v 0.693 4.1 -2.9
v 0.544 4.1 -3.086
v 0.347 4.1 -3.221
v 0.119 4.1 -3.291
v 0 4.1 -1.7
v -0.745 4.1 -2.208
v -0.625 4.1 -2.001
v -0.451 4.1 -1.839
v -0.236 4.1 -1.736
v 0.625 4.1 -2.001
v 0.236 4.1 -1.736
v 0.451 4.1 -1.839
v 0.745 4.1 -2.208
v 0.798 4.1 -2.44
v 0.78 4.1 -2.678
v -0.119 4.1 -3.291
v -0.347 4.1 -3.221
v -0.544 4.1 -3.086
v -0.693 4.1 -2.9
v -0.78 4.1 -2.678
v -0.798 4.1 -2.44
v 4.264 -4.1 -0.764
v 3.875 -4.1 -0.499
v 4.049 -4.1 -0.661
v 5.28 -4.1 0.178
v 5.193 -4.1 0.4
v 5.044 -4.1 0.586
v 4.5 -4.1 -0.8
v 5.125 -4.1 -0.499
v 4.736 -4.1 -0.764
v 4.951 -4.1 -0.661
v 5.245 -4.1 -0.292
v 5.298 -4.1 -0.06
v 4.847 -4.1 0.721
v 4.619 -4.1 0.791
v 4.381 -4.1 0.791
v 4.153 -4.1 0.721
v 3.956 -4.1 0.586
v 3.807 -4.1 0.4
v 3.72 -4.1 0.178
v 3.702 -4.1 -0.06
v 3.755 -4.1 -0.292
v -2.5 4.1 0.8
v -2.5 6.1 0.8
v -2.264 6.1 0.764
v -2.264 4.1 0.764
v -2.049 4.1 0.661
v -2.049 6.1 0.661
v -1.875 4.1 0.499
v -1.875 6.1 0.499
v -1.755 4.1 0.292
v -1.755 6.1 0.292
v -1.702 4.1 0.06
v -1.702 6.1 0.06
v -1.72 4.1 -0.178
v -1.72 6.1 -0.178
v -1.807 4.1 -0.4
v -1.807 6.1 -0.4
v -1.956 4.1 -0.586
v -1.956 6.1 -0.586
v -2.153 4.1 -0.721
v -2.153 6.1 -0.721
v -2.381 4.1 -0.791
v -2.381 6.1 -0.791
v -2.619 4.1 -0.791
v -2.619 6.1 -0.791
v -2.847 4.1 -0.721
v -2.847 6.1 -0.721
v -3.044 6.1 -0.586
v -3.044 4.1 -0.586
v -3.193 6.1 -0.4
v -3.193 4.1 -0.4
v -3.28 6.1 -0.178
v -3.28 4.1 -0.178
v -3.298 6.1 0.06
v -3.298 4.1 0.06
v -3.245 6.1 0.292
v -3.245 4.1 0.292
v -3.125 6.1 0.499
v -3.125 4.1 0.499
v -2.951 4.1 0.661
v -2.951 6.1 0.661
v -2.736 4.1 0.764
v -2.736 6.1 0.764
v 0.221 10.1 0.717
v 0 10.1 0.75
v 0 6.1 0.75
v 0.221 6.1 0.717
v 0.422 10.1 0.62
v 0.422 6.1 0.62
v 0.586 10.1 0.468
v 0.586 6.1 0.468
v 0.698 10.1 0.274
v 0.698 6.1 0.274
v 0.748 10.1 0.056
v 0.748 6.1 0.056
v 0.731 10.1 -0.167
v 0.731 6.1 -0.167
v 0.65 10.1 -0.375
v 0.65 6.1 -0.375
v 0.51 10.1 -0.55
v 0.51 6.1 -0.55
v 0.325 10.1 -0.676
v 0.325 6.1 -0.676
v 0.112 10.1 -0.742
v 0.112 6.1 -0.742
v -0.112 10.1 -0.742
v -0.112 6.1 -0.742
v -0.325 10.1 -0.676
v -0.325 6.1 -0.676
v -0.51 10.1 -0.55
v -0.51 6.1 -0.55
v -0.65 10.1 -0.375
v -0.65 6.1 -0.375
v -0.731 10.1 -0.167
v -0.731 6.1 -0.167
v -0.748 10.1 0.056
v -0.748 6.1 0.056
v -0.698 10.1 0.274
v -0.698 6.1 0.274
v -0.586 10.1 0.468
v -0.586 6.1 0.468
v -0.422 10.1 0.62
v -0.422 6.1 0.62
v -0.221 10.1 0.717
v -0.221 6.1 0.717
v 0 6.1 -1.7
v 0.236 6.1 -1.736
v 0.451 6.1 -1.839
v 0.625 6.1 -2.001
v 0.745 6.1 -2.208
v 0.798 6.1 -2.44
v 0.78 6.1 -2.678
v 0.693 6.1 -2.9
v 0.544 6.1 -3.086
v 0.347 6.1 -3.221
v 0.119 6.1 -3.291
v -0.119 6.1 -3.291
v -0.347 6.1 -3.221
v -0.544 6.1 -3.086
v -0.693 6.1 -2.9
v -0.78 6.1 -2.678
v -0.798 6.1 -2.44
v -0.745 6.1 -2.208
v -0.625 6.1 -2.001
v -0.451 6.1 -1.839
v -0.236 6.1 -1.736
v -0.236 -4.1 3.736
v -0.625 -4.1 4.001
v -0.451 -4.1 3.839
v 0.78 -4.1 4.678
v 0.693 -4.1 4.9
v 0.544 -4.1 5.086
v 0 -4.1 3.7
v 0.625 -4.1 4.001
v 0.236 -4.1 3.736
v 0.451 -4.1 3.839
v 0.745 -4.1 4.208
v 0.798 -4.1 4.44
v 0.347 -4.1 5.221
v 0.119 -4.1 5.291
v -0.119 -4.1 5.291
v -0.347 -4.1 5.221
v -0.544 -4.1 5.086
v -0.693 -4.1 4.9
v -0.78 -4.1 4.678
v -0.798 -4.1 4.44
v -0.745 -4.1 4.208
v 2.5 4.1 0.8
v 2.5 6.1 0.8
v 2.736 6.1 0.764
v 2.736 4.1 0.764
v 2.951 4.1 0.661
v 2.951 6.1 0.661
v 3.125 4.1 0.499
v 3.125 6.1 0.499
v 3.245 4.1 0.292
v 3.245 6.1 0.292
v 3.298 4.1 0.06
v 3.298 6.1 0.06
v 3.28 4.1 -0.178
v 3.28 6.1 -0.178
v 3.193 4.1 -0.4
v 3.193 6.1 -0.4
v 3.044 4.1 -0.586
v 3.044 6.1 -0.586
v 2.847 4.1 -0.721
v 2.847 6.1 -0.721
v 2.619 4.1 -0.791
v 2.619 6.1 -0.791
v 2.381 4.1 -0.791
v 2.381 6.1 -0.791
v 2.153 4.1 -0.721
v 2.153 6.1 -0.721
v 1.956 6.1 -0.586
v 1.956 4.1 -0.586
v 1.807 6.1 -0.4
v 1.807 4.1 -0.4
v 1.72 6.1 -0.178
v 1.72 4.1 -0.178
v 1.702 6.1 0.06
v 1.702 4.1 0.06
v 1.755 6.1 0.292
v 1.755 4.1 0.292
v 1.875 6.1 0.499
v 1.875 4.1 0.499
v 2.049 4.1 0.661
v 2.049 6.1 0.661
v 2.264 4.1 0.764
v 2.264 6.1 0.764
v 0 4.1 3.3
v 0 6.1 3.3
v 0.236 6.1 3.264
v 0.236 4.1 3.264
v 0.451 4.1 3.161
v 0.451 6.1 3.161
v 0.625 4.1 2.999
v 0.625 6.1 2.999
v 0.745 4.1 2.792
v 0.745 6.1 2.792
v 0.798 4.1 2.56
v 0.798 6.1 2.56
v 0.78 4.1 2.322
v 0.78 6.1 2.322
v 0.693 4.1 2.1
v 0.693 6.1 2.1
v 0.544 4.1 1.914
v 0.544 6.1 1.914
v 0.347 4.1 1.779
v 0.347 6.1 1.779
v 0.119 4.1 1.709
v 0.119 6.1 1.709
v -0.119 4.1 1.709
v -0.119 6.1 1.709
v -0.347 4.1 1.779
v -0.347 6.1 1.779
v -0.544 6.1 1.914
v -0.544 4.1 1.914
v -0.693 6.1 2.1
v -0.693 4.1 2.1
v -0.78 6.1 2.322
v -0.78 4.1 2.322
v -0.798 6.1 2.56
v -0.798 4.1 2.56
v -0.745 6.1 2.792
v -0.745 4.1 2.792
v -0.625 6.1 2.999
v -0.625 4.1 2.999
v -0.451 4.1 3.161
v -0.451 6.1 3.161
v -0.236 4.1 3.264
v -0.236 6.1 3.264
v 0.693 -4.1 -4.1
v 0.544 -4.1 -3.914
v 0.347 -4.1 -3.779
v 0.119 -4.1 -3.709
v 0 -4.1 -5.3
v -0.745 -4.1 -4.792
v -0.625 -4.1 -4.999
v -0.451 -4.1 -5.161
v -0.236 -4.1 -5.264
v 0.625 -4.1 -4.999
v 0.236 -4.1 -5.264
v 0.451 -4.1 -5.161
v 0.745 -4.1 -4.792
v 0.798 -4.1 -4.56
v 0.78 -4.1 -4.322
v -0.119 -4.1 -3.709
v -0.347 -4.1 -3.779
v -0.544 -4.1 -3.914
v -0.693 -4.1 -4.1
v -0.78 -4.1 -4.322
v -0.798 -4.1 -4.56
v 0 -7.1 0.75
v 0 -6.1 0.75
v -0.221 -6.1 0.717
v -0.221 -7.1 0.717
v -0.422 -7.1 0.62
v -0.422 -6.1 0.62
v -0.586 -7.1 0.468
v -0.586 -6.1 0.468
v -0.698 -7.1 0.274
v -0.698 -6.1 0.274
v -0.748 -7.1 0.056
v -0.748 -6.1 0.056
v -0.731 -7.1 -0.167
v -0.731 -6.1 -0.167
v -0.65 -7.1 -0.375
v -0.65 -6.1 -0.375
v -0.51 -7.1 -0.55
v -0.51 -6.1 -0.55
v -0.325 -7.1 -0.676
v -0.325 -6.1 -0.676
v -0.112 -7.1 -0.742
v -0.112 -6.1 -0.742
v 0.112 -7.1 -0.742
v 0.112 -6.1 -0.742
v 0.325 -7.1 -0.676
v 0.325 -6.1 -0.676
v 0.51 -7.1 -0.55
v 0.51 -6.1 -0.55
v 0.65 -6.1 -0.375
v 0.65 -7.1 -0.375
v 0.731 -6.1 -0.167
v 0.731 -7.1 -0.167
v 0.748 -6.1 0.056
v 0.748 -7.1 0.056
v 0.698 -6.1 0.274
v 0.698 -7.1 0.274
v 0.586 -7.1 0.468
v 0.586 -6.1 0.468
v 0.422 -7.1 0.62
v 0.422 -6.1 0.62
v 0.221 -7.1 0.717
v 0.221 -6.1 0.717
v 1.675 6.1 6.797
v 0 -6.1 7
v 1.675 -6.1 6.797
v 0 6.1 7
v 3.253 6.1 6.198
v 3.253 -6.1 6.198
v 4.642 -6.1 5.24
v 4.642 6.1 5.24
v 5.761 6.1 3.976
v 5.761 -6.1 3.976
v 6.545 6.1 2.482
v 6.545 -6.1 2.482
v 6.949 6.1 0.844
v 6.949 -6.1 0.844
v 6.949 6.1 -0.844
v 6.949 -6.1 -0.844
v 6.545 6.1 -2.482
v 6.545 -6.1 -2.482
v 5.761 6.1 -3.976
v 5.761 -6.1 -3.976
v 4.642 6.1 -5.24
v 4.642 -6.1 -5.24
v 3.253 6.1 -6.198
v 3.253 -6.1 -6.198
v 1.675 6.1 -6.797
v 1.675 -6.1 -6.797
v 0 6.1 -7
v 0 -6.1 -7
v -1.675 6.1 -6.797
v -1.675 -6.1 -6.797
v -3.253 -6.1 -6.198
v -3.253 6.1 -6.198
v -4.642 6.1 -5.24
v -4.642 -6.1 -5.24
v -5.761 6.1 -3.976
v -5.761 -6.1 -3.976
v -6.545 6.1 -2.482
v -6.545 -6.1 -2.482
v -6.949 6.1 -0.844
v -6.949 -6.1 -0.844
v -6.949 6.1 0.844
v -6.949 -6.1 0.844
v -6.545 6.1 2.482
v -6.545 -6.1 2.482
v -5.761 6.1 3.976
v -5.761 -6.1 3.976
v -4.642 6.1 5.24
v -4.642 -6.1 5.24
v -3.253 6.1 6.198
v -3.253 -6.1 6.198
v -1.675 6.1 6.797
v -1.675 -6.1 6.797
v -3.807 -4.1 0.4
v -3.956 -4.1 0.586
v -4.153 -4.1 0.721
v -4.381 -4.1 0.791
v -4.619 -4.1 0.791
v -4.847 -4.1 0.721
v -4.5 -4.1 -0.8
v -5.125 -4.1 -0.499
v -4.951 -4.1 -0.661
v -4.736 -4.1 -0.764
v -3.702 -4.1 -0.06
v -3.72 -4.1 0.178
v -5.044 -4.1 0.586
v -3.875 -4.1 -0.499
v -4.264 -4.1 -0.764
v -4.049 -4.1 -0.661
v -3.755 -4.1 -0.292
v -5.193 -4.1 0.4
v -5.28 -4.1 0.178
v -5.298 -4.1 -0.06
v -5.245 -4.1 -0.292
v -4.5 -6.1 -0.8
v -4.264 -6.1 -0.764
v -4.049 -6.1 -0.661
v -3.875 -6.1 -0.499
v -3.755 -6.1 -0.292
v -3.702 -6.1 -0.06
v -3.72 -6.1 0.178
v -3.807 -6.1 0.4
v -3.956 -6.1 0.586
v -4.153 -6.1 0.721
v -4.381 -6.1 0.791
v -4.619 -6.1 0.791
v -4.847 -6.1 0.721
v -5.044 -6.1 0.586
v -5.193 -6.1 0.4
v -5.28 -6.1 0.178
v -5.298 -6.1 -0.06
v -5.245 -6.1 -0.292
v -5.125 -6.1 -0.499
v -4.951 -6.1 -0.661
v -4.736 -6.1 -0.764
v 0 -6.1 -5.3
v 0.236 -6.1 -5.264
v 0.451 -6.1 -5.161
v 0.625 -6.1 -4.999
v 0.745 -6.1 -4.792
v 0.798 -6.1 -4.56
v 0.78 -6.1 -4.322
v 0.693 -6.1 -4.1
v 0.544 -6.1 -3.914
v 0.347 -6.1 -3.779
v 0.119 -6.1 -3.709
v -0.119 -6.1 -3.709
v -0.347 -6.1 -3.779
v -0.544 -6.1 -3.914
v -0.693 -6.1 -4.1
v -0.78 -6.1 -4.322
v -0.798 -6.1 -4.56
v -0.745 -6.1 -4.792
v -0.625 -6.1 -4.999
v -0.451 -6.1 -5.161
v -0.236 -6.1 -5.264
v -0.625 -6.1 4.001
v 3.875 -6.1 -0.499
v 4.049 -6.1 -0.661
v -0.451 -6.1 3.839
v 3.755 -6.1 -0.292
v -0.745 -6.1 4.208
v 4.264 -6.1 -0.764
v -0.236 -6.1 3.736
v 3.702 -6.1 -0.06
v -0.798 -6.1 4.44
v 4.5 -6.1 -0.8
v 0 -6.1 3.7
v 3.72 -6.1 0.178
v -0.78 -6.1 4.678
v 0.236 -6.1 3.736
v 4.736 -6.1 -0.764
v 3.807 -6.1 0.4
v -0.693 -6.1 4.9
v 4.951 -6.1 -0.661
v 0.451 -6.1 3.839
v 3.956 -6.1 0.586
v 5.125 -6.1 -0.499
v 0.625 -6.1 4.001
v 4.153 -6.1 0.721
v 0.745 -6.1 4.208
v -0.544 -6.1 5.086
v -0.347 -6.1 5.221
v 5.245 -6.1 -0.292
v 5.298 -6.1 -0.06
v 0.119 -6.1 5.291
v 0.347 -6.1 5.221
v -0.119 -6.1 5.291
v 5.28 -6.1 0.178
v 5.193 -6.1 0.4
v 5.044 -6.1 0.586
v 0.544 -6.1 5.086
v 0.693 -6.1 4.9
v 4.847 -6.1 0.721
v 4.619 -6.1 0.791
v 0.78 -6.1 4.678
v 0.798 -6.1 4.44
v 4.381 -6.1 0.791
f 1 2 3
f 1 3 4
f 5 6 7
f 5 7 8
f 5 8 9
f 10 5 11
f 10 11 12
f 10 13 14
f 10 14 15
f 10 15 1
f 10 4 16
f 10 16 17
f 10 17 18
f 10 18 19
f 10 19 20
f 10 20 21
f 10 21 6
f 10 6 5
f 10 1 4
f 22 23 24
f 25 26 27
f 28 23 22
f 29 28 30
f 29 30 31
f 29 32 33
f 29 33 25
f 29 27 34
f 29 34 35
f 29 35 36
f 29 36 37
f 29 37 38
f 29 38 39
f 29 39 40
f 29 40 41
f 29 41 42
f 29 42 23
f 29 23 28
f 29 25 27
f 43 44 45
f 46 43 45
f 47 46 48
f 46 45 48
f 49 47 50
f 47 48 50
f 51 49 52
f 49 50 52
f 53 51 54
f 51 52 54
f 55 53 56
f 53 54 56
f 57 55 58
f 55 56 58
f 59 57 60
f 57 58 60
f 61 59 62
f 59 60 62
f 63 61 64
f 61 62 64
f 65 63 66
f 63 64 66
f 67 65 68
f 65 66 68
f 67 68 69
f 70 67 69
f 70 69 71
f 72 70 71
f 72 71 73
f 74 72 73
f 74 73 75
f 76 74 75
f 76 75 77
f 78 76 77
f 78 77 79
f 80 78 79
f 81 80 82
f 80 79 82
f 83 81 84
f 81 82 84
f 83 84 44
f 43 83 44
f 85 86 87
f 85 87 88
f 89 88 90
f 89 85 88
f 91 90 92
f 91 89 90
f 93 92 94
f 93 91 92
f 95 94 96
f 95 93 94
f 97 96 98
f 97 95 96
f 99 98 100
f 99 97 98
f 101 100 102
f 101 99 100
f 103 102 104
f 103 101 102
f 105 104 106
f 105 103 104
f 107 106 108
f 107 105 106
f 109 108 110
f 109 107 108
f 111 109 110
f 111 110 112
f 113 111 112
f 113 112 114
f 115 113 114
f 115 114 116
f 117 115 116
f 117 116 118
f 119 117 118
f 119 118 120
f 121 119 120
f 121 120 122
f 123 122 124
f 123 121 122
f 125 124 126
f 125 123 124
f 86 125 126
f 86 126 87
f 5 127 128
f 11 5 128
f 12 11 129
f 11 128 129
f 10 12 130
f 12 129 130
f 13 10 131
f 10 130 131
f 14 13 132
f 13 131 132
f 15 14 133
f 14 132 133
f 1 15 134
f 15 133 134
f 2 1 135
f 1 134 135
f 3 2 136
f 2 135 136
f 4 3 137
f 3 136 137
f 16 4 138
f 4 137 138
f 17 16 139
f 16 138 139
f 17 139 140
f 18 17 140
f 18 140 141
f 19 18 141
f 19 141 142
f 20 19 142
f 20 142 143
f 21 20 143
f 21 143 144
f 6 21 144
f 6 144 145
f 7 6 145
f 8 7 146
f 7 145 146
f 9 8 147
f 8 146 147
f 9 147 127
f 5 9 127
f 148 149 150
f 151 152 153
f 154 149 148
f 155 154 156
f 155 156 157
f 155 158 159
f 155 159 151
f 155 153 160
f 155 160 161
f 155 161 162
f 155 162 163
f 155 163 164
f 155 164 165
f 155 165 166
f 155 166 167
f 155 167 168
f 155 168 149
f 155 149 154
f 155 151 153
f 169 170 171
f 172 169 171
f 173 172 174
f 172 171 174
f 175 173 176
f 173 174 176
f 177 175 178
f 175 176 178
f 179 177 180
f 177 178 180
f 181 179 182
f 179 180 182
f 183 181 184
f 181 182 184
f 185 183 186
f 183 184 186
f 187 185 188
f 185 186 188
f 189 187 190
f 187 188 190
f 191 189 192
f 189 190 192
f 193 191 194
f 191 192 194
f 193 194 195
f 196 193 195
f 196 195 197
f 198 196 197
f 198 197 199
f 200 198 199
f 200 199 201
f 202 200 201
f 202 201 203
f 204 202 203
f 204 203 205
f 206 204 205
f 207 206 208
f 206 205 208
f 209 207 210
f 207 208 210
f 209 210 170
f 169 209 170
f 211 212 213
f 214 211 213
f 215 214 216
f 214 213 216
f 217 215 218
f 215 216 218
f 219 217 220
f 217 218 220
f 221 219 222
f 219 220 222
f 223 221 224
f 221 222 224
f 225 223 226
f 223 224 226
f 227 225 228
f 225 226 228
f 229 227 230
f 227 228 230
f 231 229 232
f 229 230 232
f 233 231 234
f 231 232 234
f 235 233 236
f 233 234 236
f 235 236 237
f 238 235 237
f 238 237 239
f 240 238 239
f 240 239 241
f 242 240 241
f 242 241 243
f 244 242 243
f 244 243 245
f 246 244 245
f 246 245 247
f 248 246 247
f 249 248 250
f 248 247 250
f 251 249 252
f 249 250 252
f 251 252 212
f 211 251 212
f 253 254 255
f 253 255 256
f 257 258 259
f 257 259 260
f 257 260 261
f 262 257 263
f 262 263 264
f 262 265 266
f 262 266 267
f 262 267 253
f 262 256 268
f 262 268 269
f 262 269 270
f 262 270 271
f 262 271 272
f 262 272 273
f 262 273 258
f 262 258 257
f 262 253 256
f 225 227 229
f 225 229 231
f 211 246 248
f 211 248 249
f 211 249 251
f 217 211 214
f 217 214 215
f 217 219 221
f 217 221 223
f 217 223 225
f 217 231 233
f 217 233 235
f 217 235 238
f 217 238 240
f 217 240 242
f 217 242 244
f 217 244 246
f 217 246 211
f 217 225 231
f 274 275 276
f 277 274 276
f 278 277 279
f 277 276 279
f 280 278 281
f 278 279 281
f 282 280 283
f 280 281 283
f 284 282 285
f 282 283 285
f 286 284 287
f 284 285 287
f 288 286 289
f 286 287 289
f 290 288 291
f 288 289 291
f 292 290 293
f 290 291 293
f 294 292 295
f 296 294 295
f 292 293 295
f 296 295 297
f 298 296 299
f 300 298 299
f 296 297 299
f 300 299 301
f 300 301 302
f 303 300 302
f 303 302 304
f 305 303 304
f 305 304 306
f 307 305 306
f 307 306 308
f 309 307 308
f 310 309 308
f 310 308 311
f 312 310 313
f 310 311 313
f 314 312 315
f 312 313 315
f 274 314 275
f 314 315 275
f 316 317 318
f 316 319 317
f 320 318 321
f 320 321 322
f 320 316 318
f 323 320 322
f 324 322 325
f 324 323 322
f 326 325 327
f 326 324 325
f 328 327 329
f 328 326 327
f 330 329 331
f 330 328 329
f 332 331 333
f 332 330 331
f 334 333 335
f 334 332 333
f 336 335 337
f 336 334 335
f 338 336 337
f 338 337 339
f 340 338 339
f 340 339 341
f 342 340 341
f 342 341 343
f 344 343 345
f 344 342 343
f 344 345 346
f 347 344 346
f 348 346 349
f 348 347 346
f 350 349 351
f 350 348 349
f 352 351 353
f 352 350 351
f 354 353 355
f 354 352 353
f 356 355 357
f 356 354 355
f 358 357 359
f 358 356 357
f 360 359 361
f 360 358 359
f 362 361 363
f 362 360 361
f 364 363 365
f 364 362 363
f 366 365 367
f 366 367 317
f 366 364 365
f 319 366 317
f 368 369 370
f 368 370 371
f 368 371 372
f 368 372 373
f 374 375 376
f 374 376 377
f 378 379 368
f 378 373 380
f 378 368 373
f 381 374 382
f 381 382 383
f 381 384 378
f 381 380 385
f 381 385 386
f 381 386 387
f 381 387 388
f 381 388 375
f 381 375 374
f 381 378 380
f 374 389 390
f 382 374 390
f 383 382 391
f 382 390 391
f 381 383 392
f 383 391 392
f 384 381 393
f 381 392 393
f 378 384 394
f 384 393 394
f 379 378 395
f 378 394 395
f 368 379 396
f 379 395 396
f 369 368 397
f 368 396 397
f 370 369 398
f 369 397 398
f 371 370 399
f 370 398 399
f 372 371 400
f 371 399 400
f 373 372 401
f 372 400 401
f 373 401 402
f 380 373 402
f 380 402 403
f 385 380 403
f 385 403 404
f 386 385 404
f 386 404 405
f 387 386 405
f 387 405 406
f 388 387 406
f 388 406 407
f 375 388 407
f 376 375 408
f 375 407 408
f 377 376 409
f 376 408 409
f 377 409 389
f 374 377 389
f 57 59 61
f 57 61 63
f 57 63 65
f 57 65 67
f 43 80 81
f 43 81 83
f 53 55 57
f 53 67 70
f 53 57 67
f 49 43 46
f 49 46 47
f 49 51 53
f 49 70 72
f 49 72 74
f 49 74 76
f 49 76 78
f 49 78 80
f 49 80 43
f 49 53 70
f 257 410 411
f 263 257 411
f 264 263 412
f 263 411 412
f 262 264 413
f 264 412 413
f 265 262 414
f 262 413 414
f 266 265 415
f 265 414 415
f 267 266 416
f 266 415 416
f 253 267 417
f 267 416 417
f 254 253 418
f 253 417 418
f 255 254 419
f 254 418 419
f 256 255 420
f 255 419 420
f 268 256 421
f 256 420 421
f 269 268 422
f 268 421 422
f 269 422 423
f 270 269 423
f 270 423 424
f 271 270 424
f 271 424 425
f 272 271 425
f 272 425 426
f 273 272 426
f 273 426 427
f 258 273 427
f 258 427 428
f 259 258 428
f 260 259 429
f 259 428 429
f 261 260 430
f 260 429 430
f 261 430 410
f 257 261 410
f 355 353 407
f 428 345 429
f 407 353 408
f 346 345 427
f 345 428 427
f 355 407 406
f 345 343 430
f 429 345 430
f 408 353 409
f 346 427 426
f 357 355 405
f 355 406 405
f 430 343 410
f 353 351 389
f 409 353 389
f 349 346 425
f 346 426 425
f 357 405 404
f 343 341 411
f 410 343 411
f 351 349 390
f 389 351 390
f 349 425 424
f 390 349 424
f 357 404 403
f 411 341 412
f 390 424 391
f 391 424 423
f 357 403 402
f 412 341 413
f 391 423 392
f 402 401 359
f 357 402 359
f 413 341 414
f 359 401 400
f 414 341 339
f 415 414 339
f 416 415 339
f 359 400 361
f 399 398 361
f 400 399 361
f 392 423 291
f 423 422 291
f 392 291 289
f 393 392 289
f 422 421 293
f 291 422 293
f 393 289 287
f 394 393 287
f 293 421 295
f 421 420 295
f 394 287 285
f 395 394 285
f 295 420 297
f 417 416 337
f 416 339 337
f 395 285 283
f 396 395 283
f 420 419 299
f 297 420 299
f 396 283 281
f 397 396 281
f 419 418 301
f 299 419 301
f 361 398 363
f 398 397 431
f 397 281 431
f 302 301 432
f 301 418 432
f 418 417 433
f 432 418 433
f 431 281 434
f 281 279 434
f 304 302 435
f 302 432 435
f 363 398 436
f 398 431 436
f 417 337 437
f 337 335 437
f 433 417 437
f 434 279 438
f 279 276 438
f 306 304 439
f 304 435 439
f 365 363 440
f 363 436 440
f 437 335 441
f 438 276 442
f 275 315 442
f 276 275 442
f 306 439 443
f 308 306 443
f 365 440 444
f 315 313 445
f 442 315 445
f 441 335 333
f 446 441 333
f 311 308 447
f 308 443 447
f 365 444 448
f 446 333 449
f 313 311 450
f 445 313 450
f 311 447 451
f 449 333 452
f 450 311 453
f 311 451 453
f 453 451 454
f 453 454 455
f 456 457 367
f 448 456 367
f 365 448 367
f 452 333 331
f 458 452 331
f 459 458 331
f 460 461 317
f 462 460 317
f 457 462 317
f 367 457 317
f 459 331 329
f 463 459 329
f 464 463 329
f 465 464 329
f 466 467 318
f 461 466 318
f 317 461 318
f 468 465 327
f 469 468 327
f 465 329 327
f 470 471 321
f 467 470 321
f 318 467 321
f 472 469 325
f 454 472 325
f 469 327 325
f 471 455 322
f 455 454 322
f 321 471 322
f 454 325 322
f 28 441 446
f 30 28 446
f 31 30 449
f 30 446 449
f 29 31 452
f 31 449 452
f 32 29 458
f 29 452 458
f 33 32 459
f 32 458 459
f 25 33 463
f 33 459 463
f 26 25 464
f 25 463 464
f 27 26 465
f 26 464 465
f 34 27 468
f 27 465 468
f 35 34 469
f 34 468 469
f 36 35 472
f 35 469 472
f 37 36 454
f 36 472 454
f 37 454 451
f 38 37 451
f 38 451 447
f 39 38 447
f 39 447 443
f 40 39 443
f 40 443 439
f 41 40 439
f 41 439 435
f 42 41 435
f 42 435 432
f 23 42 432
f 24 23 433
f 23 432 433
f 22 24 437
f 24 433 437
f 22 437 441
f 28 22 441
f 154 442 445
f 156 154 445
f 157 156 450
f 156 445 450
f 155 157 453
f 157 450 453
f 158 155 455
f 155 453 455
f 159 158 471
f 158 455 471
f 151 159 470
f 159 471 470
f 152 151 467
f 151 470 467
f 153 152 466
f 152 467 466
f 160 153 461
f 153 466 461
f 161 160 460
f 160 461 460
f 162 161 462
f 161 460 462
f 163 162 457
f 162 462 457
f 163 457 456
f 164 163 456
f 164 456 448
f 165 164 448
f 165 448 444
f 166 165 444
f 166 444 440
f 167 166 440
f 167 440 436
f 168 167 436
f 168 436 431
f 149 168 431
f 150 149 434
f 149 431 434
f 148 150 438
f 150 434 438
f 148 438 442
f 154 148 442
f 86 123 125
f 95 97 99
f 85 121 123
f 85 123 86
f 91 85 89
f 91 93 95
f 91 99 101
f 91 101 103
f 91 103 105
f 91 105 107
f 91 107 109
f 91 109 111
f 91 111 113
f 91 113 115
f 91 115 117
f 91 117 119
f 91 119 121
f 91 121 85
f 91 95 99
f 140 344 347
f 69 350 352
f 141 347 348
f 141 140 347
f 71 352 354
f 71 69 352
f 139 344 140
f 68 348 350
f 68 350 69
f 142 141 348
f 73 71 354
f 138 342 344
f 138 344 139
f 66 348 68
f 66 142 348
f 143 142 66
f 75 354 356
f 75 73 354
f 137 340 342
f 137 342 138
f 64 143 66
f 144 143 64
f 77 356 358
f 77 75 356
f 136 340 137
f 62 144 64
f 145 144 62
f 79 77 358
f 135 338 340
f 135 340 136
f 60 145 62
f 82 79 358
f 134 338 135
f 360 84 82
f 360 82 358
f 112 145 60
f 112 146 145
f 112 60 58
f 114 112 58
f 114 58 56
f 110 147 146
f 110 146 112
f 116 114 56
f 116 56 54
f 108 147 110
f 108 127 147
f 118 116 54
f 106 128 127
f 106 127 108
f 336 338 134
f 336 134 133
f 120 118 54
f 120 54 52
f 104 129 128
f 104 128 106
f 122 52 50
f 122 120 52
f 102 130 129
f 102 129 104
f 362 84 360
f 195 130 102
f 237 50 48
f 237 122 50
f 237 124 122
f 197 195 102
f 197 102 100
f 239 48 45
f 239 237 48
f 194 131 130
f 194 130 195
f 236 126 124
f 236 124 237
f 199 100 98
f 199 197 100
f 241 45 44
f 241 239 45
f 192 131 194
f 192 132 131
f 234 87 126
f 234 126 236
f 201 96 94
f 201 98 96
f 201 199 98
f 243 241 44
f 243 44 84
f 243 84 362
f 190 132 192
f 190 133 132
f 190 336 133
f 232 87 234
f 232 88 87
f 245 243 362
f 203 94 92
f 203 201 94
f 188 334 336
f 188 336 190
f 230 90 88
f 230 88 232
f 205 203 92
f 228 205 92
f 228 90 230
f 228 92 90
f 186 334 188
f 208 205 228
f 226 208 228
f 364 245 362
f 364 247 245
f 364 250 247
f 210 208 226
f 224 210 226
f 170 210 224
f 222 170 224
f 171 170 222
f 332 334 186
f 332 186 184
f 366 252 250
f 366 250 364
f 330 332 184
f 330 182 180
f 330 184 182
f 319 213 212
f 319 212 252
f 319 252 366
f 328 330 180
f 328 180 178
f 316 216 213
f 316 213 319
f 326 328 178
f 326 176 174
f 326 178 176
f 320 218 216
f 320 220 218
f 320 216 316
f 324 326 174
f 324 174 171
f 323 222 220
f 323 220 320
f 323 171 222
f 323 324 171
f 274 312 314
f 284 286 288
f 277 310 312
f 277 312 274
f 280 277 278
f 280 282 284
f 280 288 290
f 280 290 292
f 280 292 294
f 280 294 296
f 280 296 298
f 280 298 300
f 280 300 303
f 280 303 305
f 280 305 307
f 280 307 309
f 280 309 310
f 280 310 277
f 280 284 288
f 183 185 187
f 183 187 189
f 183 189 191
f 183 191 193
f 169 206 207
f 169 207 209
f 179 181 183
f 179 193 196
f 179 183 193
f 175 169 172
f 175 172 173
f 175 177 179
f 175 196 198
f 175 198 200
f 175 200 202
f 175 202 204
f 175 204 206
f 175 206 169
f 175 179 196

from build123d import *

# Parameters (mm, degrees)
SKETCH1_R           = 7
BOSS_EXTRUDE1_DEPTH = 6.1
SKETCH2_R           = 0.75
BOSS_EXTRUDE2_DEPTH = 1
BOSS_EXTRUDE3_START = 4
SKETCH3_R           = 0.75
BOSS_EXTRUDE3_DEPTH = 4
SKETCH4_R           = 0.8
CUT_EXTRUDE1_DEPTH  = 2
SKETCH5_R           = 0.8
CUT_EXTRUDE2_DEPTH  = 2


with BuildPart() as part:
    # Sketch1 → Boss-Extrude1 (new, symmetric)
    with BuildSketch(Plane(origin=(0, 0, 0), x_dir=(1, 0, 0), z_dir=(0, 1, 0))):
        with Locations(Location((0, 0, 0), (0, 0, 270))):
            Circle(SKETCH1_R)
    extrude(amount=BOSS_EXTRUDE1_DEPTH, both=True)

    # Sketch2 → Boss-Extrude2 (add)
    with BuildSketch(Plane.XZ.offset(6.1)):
        with Locations(Location((0, 0, 0), (0, 0, 90))):
            Circle(SKETCH2_R)
    extrude(amount=BOSS_EXTRUDE2_DEPTH)

    # Sketch3 → Boss-Extrude3 (add)
    with BuildSketch(Plane(origin=(0, 6.1, 0), x_dir=(1, 0, 0), z_dir=(0, 1, 0)).offset(BOSS_EXTRUDE3_START)):
        with Locations(Location((0, 0, 0), (0, 0, 270))):
            Circle(SKETCH3_R)
    extrude(amount=-BOSS_EXTRUDE3_DEPTH)

    # Sketch4 → Cut-Extrude1 (cut)
    with BuildSketch(Plane.XZ.offset(6.1)):
        with Locations(Location((0, 4.5, 0), (0, 0, 270))):
            Circle(SKETCH4_R)
        with Locations(Location((4.5, 0, 0), (0, 0, 270))):
            Circle(SKETCH4_R)
        with Locations(Location((0, -4.5, 0), (0, 0, 270))):
            Circle(SKETCH4_R)
        with Locations(Location((-4.5, 0, 0), (0, 0, 270))):
            Circle(SKETCH4_R)
    extrude(amount=-CUT_EXTRUDE1_DEPTH, mode=Mode.SUBTRACT)

    # Sketch5 → Cut-Extrude2 (cut)
    with BuildSketch(Plane(origin=(0, 6.1, 0), x_dir=(1, 0, 0), z_dir=(0, 1, 0))):
        with Locations(Location((2.5, 0, 0), (0, 0, 270))):
            Circle(SKETCH5_R)
        with Locations(Location((0, -2.5, 0), (0, 0, 270))):
            Circle(SKETCH5_R)
        with Locations(Location((-2.5, 0, 0), (0, 0, 270))):
            Circle(SKETCH5_R)
        with Locations(Location((0, 2.5, 0), (0, 0, 270))):
            Circle(SKETCH5_R)
    extrude(amount=-CUT_EXTRUDE2_DEPTH, mode=Mode.SUBTRACT)


solid = part.part
